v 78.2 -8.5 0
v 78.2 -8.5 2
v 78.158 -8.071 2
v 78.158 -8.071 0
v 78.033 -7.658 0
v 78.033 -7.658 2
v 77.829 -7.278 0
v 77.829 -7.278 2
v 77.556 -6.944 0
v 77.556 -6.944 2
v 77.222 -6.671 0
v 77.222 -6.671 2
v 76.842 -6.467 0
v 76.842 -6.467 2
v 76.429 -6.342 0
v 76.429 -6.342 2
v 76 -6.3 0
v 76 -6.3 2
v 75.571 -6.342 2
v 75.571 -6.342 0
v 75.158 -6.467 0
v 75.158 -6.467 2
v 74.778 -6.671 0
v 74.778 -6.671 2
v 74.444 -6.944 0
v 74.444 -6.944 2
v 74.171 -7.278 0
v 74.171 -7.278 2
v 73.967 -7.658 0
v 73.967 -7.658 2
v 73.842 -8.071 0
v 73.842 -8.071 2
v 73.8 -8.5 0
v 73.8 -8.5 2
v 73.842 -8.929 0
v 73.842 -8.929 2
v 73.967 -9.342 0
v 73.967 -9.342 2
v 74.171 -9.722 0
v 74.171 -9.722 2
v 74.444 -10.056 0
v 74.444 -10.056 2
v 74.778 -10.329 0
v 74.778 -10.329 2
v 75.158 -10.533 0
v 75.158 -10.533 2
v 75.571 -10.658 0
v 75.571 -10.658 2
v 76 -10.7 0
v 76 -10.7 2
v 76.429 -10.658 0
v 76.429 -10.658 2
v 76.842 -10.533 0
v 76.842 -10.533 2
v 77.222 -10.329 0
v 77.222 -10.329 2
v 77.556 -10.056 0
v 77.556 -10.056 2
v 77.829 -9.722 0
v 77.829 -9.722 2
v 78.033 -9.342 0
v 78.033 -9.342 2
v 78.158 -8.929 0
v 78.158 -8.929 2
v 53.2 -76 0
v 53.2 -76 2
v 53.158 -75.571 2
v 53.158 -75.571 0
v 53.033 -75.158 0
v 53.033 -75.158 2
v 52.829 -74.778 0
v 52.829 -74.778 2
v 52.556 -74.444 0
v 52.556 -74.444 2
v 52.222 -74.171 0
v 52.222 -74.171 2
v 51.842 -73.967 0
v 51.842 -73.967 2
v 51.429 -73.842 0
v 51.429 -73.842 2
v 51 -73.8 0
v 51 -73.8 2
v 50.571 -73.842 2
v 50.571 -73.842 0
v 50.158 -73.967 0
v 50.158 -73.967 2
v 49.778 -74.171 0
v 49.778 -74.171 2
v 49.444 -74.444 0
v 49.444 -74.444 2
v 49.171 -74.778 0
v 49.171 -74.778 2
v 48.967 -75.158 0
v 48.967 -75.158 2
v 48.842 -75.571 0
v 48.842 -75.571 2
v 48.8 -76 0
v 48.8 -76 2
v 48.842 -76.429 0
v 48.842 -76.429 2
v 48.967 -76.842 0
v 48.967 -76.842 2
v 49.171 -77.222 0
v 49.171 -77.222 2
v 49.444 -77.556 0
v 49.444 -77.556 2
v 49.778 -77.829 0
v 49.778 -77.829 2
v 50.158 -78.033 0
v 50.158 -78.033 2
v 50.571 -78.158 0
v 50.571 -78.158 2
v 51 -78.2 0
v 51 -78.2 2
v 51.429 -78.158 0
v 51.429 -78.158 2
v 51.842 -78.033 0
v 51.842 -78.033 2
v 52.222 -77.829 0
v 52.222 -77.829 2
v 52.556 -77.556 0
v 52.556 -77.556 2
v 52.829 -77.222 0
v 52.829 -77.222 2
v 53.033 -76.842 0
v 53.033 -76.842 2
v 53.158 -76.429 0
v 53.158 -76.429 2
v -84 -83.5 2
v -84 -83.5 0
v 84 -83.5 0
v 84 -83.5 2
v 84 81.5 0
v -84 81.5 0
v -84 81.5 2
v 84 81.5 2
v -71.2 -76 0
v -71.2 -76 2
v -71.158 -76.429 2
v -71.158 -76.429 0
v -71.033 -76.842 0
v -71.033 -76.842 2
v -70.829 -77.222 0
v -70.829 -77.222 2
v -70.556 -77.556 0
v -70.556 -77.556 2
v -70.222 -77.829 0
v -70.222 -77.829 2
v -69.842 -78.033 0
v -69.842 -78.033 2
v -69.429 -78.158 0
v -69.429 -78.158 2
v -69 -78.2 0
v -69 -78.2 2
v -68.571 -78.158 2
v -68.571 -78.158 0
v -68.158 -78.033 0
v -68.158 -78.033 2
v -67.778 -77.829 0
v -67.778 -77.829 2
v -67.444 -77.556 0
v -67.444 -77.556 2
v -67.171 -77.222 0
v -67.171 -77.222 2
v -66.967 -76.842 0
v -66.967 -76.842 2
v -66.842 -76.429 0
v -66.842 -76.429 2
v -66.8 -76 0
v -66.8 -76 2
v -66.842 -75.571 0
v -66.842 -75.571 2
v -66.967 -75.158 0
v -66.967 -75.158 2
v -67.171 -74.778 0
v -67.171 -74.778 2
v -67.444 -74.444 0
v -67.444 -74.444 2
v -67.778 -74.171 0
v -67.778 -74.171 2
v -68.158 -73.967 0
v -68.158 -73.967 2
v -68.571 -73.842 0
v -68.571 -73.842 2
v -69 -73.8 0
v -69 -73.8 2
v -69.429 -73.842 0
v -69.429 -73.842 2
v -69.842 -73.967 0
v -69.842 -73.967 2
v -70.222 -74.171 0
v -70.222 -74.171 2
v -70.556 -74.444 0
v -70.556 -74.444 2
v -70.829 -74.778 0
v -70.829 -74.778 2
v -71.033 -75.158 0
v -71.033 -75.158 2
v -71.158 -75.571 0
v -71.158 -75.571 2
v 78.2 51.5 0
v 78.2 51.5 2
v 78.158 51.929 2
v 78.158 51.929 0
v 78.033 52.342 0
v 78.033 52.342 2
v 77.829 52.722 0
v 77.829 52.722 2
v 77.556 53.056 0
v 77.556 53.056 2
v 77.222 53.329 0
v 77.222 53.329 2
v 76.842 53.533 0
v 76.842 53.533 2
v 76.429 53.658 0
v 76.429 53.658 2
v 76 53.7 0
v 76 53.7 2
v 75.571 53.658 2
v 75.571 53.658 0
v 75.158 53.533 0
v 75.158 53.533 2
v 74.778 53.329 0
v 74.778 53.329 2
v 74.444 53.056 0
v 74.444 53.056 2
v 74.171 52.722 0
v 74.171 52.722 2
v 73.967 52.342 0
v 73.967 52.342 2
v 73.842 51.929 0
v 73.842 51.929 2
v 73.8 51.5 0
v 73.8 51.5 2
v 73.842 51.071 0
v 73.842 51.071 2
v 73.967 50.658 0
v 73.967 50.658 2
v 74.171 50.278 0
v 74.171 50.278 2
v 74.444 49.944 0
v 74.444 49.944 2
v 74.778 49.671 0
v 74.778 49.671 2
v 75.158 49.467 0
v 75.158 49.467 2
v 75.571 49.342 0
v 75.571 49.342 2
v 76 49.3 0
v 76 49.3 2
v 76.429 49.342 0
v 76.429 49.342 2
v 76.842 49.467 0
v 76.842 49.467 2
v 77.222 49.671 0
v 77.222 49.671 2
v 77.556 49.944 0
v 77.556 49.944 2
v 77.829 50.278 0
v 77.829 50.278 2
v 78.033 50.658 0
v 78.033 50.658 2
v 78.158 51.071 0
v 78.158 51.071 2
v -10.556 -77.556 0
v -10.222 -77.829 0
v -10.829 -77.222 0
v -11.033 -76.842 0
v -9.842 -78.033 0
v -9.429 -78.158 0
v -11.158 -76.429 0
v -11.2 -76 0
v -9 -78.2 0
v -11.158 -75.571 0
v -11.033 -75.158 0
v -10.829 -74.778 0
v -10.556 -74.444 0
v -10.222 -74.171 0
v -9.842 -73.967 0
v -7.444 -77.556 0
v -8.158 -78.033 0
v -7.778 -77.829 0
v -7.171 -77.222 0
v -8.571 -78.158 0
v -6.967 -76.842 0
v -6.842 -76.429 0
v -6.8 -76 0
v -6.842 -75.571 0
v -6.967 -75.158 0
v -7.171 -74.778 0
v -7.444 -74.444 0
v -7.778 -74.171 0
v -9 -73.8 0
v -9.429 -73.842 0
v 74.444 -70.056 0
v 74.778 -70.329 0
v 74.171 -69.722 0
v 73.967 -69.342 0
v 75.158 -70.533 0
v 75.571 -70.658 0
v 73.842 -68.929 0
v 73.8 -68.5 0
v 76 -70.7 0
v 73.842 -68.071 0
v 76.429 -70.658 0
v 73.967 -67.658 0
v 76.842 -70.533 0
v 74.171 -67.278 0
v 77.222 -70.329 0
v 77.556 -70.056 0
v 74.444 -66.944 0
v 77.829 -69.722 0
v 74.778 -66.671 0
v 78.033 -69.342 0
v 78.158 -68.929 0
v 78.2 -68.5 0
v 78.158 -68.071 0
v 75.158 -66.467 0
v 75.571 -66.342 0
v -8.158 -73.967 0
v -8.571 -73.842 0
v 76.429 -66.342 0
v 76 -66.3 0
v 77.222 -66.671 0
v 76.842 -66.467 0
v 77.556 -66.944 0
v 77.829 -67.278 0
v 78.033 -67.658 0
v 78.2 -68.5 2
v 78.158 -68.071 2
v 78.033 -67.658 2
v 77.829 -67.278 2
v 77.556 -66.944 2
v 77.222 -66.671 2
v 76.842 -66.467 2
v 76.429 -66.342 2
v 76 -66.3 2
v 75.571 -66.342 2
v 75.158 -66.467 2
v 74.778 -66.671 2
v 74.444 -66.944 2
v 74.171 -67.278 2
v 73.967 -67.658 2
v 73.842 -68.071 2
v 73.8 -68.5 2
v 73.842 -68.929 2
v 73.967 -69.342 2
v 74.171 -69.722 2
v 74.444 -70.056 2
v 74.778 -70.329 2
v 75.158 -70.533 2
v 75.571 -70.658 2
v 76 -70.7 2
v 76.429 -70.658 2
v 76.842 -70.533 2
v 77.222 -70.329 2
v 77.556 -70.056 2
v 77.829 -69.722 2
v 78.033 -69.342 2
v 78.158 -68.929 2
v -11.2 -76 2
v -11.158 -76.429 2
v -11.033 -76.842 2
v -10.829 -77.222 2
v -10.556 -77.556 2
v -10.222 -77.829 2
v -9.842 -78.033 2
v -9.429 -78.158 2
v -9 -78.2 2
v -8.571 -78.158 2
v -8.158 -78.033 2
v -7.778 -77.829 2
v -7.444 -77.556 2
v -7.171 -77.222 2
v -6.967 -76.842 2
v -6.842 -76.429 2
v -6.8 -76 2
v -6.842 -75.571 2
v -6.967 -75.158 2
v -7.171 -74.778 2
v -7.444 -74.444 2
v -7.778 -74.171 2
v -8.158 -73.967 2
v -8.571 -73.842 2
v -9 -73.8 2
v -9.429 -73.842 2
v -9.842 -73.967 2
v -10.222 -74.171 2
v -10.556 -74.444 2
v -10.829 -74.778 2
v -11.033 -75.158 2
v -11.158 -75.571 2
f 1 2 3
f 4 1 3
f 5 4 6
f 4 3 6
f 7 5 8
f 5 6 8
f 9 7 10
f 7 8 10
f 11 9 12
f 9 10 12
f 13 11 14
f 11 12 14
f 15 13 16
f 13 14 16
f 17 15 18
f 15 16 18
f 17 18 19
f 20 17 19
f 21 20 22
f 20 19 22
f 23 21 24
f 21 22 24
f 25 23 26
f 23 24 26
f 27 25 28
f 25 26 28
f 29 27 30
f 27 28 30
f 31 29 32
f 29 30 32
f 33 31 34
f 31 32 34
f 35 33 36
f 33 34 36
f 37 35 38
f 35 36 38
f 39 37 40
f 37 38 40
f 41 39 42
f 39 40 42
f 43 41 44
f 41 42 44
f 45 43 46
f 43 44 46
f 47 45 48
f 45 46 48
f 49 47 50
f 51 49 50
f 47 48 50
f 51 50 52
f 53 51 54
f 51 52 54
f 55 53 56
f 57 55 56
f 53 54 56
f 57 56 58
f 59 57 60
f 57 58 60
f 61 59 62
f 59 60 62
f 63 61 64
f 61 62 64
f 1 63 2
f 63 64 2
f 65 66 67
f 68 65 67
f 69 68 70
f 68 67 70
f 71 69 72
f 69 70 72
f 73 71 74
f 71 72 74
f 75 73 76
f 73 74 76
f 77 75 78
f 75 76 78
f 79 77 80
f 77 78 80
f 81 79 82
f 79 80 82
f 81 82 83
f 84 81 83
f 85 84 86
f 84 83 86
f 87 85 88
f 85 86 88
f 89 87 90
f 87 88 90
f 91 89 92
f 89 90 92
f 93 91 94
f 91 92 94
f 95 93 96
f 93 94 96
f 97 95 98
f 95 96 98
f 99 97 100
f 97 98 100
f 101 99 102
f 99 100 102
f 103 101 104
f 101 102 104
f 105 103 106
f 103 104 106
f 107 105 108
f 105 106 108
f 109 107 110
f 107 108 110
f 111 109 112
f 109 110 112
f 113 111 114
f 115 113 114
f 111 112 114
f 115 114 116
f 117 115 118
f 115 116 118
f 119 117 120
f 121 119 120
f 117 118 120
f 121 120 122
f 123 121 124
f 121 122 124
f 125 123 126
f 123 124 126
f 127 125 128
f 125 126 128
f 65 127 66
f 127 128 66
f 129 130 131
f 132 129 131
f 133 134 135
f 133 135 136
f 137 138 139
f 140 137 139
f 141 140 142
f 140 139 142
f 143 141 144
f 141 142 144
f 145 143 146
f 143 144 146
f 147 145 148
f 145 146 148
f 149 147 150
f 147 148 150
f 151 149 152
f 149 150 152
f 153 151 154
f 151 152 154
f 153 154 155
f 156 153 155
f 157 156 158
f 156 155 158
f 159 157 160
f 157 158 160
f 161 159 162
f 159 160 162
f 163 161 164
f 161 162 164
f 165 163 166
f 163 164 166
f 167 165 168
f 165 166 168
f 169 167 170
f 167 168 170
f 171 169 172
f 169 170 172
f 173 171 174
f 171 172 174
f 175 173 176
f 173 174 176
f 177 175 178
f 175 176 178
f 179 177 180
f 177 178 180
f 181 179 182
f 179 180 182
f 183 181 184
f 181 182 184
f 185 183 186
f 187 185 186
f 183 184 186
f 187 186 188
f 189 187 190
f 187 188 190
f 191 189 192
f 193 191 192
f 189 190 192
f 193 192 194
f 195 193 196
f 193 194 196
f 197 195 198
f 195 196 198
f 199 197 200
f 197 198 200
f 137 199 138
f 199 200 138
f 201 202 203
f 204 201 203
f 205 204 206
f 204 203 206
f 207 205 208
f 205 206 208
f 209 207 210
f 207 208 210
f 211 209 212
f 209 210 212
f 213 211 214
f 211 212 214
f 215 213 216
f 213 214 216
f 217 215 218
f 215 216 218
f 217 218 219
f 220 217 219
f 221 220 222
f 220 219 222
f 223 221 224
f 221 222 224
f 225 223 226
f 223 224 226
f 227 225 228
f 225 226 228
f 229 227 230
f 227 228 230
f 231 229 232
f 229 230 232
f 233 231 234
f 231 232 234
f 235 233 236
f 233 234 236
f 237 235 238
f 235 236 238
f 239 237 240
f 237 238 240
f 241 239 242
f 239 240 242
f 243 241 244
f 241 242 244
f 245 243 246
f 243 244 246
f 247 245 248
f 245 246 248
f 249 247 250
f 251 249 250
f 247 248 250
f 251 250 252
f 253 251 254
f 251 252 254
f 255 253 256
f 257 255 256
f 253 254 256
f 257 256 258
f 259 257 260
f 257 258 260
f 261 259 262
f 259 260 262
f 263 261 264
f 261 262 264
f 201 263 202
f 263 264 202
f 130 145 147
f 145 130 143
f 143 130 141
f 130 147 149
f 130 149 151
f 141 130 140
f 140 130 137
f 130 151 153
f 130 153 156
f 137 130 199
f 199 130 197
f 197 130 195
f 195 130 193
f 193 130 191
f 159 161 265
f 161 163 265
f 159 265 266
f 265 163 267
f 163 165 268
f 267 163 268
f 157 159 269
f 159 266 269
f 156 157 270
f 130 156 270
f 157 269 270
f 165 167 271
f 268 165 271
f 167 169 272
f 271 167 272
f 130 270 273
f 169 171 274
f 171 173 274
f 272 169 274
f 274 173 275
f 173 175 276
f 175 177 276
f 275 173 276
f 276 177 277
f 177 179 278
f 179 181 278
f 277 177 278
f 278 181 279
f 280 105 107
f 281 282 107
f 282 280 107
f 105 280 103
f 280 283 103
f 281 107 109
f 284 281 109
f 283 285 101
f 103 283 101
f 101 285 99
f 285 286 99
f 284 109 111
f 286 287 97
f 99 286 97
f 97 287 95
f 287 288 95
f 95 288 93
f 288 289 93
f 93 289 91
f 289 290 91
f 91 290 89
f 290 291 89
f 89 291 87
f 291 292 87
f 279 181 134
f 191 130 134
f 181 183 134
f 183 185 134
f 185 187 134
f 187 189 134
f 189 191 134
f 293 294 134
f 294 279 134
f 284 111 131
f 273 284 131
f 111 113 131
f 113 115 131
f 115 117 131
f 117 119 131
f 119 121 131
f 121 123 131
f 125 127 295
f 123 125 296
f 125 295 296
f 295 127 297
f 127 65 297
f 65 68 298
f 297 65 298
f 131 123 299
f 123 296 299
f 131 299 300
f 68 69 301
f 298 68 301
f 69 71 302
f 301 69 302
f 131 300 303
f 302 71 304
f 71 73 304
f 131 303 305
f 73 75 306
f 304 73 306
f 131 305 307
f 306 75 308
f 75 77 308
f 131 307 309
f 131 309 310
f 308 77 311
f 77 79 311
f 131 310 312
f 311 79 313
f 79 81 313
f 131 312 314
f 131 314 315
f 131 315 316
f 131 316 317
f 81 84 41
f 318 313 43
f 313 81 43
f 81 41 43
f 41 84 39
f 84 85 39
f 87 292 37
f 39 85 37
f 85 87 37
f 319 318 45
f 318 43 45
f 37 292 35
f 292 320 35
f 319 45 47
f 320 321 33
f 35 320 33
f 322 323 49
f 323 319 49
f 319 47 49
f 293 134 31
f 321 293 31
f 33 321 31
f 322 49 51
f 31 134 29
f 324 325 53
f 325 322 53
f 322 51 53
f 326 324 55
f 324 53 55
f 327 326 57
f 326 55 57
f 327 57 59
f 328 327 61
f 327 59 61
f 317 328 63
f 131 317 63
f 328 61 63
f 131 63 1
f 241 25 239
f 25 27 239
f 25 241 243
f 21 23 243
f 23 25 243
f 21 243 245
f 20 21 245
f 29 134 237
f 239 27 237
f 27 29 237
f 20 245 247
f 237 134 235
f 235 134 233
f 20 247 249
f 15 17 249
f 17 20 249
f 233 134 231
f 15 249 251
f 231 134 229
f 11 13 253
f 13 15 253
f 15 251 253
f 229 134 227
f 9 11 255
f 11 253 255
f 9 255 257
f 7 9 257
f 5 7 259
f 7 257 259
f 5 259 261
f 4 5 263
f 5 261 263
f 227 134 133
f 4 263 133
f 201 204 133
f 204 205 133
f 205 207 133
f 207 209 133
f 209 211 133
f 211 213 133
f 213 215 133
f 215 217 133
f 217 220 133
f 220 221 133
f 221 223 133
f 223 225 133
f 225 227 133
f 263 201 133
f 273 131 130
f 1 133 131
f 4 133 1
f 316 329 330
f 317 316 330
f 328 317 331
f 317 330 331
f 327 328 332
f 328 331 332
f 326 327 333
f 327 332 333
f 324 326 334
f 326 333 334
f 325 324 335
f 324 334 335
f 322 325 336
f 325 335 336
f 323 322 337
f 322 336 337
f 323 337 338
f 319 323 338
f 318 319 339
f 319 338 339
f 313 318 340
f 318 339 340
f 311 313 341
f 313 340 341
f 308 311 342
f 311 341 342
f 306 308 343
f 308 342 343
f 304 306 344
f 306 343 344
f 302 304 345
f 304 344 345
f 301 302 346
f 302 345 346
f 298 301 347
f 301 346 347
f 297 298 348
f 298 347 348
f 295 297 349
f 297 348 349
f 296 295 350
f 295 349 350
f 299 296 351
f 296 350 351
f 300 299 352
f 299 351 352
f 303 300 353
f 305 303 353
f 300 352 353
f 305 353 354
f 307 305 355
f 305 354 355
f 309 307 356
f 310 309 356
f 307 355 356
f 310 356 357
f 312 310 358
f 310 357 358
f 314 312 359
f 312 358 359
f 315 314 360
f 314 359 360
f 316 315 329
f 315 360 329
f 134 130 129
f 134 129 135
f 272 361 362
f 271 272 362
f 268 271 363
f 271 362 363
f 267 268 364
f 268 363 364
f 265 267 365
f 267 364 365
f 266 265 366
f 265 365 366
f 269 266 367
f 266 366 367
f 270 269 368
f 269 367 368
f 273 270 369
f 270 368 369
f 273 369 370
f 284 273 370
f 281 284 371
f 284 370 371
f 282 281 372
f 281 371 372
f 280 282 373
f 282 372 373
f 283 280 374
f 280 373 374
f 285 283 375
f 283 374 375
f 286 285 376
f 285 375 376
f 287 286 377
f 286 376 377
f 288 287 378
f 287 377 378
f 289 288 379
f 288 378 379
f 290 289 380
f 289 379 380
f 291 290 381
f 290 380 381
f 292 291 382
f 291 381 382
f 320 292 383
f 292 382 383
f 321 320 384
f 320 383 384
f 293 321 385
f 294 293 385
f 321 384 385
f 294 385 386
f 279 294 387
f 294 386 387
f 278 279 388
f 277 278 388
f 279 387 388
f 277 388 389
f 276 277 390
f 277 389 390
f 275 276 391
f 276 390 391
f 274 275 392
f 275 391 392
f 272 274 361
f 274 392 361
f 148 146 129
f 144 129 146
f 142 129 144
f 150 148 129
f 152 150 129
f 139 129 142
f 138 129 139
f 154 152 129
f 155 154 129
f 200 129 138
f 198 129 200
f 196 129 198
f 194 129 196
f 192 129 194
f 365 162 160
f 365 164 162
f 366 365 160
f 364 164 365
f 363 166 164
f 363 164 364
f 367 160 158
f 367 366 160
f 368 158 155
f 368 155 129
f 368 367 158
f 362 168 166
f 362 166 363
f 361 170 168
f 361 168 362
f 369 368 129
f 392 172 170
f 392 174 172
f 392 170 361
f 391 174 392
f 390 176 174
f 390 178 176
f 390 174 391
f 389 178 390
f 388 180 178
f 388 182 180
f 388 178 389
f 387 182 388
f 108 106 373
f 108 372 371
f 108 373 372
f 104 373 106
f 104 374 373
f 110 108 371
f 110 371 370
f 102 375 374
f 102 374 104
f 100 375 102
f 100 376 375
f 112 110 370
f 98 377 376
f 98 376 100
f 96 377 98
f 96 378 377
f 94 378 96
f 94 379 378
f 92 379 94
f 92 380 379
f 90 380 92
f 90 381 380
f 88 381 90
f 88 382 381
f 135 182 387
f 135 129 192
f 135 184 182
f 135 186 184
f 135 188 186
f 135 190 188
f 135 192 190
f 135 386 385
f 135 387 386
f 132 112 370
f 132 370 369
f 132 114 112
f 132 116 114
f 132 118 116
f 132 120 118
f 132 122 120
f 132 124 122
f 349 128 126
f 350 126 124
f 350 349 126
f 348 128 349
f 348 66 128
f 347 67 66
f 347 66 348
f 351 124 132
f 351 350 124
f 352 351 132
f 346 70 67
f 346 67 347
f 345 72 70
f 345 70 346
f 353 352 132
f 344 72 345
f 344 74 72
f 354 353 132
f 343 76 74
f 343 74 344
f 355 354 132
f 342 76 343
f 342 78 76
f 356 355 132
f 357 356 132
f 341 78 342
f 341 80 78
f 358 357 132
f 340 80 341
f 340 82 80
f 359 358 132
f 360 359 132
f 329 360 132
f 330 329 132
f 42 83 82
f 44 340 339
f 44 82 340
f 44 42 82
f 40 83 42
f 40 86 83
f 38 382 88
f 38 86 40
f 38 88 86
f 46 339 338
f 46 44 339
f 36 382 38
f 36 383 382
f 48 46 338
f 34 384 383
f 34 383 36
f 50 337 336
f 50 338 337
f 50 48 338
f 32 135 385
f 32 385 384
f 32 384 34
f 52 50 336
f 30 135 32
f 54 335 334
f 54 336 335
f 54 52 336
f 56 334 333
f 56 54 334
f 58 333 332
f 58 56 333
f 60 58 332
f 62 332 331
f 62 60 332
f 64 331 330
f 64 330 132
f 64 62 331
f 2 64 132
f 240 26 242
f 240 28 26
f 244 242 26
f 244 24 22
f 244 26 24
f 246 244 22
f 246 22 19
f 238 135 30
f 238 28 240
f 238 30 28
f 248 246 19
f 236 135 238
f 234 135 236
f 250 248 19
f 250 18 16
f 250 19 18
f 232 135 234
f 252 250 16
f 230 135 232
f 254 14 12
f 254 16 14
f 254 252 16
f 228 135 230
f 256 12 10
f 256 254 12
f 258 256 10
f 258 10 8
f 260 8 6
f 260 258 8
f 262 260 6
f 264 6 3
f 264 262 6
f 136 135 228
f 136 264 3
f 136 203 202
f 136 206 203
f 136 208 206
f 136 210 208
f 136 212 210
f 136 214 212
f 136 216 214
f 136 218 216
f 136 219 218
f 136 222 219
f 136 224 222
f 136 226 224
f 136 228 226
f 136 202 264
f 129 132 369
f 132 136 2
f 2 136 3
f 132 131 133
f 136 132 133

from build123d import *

# Parameters (mm, degrees)
SKETCH_1_W          = 168
SKETCH_1_H          = 167
EXTRUDE_1_DEPTH     = 2
SKETCH_2_R          = 2.2
CUT_EXTRUDE_1_DEPTH = 2
SKETCH_3_W          = 168
SKETCH_3_H          = 2
CUT_EXTRUDE_2_DEPTH = 2
SKETCH_4_R          = 2.2
CUT_EXTRUDE_3_DEPTH = 2


with BuildPart() as part:
    # ｽｹｯﾁ1 → ﾎﾞｽ - 押し出し1 (new body)
    with BuildSketch(Plane.XY):
        Rectangle(SKETCH_1_W, SKETCH_1_H)
    extrude(amount=EXTRUDE_1_DEPTH)

    # ｽｹｯﾁ2 → ｶｯﾄ - 押し出し1 (cut)
    with BuildSketch(Plane.XY.offset(2)):
        with Locations((76, -68.5)):
            Circle(SKETCH_2_R)
        with Locations((76, -8.5)):
            Circle(SKETCH_2_R)
        with Locations((76, 51.5)):
            Circle(SKETCH_2_R)
    extrude(amount=-CUT_EXTRUDE_1_DEPTH, mode=Mode.SUBTRACT)

    # ｽｹｯﾁ3 → ｶｯﾄ - 押し出し2 (cut)
    with BuildSketch(Plane(origin=(0, 83.5, 0), x_dir=(1, 0, 0), z_dir=(0, 1, 0))):
        with Locations((0, -1)):
            Rectangle(SKETCH_3_W, SKETCH_3_H)
    extrude(amount=-CUT_EXTRUDE_2_DEPTH, mode=Mode.SUBTRACT)

    # ｽｹｯﾁ4 → ｶｯﾄ - 押し出し3 (cut)
    with BuildSketch(Plane.XY.offset(2)):
        with BuildLine():
            ThreePointArc((-6.8, -76), (-9, -73.8), (-11.2, -76))
            Line((-11.2, -76), (-9, -76))
            Line((-9, -76), (-6.8, -76))
        make_face()
        with BuildLine():
            Line((-9, -76), (-11.2, -76))
            ThreePointArc((-11.2, -76), (-9, -78.2), (-6.8, -76))
            Line((-6.8, -76), (-9, -76))
        make_face()
        with BuildLine():
            ThreePointArc((-66.8, -76), (-69, -73.8), (-71.2, -76))
            Line((-71.2, -76), (-69, -76))
            Line((-69, -76), (-66.8, -76))
        make_face()
        with BuildLine():
            Line((-69, -76), (-71.2, -76))
            ThreePointArc((-71.2, -76), (-69, -78.2), (-66.8, -76))
            Line((-66.8, -76), (-69, -76))
        make_face()
        with Locations((51, -76)):
            Circle(SKETCH_4_R)
    extrude(amount=-CUT_EXTRUDE_3_DEPTH, mode=Mode.SUBTRACT)


solid = part.part
